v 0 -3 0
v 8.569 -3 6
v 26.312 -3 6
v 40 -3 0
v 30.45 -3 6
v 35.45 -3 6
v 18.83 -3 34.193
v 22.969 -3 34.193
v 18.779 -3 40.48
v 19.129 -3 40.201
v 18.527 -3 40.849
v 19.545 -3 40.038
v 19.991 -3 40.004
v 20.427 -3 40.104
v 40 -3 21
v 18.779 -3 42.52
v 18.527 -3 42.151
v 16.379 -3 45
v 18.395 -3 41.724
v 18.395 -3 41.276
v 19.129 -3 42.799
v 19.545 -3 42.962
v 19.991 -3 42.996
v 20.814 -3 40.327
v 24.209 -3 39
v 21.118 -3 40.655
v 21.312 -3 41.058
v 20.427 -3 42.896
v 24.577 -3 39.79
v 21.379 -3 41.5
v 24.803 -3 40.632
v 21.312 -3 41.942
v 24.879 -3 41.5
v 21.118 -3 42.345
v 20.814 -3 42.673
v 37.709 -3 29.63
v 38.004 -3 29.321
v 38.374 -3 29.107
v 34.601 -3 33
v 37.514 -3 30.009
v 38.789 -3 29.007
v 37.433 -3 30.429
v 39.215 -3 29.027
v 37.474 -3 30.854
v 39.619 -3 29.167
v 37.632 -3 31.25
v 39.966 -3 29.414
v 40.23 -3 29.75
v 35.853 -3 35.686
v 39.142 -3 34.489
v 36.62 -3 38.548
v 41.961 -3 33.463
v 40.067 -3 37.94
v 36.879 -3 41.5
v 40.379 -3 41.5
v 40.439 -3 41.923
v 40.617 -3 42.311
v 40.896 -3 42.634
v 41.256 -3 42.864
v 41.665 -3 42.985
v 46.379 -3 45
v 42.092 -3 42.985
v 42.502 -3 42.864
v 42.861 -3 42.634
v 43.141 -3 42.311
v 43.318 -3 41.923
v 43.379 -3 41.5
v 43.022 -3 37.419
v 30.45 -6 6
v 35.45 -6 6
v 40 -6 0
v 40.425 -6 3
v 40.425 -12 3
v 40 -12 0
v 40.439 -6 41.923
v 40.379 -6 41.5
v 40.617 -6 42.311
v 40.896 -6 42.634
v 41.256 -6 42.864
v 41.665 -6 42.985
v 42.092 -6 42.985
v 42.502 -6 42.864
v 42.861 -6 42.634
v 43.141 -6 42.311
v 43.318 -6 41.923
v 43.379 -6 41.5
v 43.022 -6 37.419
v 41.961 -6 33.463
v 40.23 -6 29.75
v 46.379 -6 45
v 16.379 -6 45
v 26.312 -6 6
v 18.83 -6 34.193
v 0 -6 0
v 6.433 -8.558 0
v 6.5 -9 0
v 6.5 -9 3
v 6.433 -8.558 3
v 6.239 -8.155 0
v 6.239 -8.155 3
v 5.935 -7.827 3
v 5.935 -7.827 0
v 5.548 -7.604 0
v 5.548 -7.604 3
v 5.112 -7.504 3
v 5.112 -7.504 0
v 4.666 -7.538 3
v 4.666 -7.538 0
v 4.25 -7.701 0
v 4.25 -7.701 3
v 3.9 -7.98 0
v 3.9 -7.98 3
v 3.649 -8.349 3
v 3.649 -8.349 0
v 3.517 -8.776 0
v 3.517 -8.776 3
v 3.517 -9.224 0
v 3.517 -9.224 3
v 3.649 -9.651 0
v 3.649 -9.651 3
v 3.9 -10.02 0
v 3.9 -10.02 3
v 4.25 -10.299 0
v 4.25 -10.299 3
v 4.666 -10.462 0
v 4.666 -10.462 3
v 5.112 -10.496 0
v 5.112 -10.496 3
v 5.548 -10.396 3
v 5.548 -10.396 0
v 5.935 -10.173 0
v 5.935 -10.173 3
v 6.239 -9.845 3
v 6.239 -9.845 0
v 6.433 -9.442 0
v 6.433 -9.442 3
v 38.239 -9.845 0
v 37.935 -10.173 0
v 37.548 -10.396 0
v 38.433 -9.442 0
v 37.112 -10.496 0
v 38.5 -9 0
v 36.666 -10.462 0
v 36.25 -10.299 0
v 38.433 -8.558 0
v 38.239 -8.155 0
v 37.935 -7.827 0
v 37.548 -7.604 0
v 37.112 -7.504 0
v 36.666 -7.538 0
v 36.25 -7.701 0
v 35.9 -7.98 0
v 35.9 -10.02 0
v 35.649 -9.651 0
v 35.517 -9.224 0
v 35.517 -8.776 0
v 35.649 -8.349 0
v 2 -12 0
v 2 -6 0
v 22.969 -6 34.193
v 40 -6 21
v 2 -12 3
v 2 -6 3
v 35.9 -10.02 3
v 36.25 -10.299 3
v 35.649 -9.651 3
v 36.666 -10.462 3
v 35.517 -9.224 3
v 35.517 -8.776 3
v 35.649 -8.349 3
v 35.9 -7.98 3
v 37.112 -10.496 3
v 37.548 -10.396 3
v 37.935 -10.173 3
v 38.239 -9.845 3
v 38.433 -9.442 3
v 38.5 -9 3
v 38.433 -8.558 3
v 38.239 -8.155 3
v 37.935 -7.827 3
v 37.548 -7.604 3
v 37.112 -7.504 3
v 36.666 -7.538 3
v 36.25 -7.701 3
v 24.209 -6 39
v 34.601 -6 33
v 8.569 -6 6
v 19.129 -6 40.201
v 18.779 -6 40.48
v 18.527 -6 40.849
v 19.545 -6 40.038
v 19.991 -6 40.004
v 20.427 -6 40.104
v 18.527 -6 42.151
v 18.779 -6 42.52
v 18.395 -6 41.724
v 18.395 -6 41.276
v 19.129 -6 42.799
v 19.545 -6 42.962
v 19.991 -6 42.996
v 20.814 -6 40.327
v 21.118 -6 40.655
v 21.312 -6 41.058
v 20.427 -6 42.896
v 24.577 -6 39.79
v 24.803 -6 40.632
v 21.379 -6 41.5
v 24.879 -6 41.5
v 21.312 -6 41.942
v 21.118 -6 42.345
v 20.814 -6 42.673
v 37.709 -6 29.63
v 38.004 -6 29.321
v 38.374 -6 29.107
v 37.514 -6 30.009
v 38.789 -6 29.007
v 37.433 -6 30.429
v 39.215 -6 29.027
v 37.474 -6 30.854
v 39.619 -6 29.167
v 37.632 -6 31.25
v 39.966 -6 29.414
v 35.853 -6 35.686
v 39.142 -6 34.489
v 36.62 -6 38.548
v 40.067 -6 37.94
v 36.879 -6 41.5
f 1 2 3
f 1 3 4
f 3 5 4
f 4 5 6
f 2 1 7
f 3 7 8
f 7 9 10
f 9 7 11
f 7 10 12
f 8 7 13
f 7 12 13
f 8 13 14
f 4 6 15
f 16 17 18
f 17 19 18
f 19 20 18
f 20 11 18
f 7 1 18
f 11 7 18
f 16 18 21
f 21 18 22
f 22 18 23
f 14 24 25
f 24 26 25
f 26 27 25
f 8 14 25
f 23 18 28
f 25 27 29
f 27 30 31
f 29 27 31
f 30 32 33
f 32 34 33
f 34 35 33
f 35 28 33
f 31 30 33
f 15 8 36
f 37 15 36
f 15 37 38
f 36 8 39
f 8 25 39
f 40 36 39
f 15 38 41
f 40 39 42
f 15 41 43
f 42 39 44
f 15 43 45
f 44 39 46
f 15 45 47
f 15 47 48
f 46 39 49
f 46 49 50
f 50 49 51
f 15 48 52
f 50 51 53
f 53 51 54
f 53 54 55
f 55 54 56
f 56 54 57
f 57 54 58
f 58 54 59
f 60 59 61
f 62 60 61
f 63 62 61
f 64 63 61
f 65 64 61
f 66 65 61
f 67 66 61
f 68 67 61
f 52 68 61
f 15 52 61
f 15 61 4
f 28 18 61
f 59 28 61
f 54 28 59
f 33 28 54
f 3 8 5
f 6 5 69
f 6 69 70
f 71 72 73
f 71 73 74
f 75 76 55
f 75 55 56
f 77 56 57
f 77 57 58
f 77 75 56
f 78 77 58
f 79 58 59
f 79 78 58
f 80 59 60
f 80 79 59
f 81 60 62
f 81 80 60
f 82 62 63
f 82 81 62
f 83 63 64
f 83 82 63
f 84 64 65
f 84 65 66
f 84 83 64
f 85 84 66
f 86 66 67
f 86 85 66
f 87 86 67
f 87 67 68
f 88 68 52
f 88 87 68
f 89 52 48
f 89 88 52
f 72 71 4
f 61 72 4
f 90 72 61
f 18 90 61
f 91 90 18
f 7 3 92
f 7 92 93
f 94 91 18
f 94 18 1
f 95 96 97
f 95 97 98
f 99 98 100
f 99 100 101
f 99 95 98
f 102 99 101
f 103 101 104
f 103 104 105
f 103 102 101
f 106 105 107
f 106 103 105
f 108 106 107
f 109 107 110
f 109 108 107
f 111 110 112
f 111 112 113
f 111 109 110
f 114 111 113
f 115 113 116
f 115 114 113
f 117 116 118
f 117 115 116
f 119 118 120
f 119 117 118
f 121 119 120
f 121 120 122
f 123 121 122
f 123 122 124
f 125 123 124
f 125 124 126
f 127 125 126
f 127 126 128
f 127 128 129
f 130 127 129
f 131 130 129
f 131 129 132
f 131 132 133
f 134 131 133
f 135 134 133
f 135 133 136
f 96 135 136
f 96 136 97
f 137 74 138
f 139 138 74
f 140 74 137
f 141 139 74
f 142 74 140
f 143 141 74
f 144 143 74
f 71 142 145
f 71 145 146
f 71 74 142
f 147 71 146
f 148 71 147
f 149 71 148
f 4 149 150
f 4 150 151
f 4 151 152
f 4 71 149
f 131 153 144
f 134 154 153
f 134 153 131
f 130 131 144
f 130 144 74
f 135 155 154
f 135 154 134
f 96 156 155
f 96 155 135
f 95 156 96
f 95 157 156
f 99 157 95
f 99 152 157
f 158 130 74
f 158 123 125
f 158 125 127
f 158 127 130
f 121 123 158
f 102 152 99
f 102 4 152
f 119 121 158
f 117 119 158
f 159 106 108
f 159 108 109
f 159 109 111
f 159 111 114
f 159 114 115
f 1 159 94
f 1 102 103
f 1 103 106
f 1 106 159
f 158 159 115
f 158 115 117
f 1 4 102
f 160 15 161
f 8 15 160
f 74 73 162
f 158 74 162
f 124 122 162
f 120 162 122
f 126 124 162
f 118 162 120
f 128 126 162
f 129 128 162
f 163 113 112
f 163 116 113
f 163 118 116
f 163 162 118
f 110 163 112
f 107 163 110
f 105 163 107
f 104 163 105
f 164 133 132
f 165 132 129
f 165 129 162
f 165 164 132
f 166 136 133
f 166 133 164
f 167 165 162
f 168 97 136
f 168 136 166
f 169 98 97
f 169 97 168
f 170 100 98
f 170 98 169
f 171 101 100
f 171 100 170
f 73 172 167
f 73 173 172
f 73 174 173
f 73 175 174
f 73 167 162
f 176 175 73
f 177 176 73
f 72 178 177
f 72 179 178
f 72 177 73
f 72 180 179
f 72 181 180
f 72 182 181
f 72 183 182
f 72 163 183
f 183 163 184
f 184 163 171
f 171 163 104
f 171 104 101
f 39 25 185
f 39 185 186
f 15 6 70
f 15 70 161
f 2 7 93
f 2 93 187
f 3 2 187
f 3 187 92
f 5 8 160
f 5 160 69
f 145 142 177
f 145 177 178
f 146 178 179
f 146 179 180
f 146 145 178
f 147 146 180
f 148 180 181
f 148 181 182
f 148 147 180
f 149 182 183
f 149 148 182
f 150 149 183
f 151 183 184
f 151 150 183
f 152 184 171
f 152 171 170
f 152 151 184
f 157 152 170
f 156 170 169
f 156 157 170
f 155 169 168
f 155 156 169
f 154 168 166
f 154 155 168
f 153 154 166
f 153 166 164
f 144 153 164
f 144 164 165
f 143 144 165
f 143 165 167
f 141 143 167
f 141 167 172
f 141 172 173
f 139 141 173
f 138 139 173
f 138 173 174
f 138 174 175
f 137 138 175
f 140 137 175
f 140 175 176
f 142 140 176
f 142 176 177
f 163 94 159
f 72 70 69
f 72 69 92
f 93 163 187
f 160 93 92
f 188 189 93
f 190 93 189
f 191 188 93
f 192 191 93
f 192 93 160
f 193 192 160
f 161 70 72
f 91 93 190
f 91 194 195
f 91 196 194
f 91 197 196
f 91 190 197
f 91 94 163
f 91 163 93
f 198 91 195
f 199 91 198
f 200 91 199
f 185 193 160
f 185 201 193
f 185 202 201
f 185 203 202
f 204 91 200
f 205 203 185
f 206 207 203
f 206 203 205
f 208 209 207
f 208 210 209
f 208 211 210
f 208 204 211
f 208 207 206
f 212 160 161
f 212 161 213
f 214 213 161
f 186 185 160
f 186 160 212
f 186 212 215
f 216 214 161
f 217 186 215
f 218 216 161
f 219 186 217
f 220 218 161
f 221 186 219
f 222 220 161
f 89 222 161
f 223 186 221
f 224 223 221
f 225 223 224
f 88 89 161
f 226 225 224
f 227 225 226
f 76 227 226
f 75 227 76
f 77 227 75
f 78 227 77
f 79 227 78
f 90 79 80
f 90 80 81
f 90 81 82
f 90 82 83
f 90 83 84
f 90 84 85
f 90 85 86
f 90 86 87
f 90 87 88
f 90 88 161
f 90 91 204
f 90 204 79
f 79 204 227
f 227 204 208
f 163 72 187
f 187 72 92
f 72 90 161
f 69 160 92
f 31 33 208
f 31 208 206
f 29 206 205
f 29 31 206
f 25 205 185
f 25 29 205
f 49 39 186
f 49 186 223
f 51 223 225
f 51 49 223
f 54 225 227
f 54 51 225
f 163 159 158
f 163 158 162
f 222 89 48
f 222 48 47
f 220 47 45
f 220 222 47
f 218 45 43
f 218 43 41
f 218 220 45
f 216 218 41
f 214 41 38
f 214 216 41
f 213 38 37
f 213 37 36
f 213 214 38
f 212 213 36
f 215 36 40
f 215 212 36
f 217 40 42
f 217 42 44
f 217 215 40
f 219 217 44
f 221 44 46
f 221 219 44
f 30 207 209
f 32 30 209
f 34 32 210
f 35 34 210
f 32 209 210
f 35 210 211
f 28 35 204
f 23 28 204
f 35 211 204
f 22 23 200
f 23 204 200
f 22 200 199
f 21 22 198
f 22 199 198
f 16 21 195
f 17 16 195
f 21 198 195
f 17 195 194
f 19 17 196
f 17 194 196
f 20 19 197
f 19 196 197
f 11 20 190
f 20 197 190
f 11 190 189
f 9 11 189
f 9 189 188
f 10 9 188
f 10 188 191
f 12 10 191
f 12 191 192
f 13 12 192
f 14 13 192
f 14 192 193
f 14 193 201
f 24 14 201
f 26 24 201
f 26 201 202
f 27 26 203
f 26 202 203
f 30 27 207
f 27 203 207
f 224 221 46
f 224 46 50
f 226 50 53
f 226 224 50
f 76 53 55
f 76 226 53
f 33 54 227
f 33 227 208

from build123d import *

# Parameters (mm, degrees)
F0_R     = 1.5
F1_DEPTH = 3
F3_DEPTH = 6
F4_R     = 1.5
F5_DEPTH = 25
F7_DEPTH = 25


with BuildPart() as f1:
    # F0 (on Front) → F1 (new body)
    with BuildSketch(Plane.XZ):
        Polygon((16.378661, 45), (0, 0), (40, 0), (46.378661, 45), align=None)
        with Locations((19.878661, 41.5)):
            Circle(F0_R, mode=Mode.SUBTRACT)
        with BuildLine():
            ThreePointArc((43.378661, 41.5), (42.577917, 35.417752), (40.230258, 29.75))
            ThreePointArc((40.230258, 29.75), (38.181219, 29.200962), (37.632181, 31.25))
            ThreePointArc((37.632181, 31.25), (39.68014, 36.19421), (40.378661, 41.5))
            ThreePointArc((40.378661, 41.5), (41.878661, 43), (43.378661, 41.5))
        make_face(mode=Mode.SUBTRACT)
    extrude(amount=F1_DEPTH)

    # F2 (on face) → F3 (join)
    with BuildSketch(Plane(origin=(0, 0, 0), x_dir=(-1, 0, 0), z_dir=(0, 1, 0))):
        Polygon((-40.425244, 3), (-40, 0), (-2, 0), (-2, 3), align=None)
    extrude(amount=F3_DEPTH)

    # F4 (on face) → F5 (cut)
    with BuildSketch(Plane(origin=(0, 0, 0), x_dir=(1, 0, 0), z_dir=(0, 0, -1))):
        with Locations((37, -3)):
            Circle(F4_R)
        with Locations((5, -3)):
            Circle(F4_R)
    extrude(amount=-F5_DEPTH, mode=Mode.SUBTRACT)

    # F6 (on face) → F7 (cut)
    with BuildSketch(Plane.XZ.offset(3)):
        Polygon((18.830264, 34.192898), (8.568888, 6), (26.311674, 6), align=None)
        Polygon((40, 21), (22.968705, 34.192898), (30.450115, 6), (35.450115, 6), align=None)
        with BuildLine():
            ThreePointArc((24.878661, 41.5), (24.70829, 40.205905), (24.208788, 39))
            Line((24.208788, 39), (34.601092, 33))
            ThreePointArc((34.601092, 33), (36.2994, 37.100076), (36.878661, 41.5))
            Line((36.878661, 41.5), (24.878661, 41.5))
        make_face()
    extrude(amount=-F7_DEPTH, mode=Mode.SUBTRACT)


with BuildPart() as f8_1:
    # F8: instance of F1
    add(f1.part.mirror(Plane(origin=(24.806781, -3, 21.611158), x_dir=(1, 0, 0), z_dir=(0, -1, 0))))


solid = f8_1.part
